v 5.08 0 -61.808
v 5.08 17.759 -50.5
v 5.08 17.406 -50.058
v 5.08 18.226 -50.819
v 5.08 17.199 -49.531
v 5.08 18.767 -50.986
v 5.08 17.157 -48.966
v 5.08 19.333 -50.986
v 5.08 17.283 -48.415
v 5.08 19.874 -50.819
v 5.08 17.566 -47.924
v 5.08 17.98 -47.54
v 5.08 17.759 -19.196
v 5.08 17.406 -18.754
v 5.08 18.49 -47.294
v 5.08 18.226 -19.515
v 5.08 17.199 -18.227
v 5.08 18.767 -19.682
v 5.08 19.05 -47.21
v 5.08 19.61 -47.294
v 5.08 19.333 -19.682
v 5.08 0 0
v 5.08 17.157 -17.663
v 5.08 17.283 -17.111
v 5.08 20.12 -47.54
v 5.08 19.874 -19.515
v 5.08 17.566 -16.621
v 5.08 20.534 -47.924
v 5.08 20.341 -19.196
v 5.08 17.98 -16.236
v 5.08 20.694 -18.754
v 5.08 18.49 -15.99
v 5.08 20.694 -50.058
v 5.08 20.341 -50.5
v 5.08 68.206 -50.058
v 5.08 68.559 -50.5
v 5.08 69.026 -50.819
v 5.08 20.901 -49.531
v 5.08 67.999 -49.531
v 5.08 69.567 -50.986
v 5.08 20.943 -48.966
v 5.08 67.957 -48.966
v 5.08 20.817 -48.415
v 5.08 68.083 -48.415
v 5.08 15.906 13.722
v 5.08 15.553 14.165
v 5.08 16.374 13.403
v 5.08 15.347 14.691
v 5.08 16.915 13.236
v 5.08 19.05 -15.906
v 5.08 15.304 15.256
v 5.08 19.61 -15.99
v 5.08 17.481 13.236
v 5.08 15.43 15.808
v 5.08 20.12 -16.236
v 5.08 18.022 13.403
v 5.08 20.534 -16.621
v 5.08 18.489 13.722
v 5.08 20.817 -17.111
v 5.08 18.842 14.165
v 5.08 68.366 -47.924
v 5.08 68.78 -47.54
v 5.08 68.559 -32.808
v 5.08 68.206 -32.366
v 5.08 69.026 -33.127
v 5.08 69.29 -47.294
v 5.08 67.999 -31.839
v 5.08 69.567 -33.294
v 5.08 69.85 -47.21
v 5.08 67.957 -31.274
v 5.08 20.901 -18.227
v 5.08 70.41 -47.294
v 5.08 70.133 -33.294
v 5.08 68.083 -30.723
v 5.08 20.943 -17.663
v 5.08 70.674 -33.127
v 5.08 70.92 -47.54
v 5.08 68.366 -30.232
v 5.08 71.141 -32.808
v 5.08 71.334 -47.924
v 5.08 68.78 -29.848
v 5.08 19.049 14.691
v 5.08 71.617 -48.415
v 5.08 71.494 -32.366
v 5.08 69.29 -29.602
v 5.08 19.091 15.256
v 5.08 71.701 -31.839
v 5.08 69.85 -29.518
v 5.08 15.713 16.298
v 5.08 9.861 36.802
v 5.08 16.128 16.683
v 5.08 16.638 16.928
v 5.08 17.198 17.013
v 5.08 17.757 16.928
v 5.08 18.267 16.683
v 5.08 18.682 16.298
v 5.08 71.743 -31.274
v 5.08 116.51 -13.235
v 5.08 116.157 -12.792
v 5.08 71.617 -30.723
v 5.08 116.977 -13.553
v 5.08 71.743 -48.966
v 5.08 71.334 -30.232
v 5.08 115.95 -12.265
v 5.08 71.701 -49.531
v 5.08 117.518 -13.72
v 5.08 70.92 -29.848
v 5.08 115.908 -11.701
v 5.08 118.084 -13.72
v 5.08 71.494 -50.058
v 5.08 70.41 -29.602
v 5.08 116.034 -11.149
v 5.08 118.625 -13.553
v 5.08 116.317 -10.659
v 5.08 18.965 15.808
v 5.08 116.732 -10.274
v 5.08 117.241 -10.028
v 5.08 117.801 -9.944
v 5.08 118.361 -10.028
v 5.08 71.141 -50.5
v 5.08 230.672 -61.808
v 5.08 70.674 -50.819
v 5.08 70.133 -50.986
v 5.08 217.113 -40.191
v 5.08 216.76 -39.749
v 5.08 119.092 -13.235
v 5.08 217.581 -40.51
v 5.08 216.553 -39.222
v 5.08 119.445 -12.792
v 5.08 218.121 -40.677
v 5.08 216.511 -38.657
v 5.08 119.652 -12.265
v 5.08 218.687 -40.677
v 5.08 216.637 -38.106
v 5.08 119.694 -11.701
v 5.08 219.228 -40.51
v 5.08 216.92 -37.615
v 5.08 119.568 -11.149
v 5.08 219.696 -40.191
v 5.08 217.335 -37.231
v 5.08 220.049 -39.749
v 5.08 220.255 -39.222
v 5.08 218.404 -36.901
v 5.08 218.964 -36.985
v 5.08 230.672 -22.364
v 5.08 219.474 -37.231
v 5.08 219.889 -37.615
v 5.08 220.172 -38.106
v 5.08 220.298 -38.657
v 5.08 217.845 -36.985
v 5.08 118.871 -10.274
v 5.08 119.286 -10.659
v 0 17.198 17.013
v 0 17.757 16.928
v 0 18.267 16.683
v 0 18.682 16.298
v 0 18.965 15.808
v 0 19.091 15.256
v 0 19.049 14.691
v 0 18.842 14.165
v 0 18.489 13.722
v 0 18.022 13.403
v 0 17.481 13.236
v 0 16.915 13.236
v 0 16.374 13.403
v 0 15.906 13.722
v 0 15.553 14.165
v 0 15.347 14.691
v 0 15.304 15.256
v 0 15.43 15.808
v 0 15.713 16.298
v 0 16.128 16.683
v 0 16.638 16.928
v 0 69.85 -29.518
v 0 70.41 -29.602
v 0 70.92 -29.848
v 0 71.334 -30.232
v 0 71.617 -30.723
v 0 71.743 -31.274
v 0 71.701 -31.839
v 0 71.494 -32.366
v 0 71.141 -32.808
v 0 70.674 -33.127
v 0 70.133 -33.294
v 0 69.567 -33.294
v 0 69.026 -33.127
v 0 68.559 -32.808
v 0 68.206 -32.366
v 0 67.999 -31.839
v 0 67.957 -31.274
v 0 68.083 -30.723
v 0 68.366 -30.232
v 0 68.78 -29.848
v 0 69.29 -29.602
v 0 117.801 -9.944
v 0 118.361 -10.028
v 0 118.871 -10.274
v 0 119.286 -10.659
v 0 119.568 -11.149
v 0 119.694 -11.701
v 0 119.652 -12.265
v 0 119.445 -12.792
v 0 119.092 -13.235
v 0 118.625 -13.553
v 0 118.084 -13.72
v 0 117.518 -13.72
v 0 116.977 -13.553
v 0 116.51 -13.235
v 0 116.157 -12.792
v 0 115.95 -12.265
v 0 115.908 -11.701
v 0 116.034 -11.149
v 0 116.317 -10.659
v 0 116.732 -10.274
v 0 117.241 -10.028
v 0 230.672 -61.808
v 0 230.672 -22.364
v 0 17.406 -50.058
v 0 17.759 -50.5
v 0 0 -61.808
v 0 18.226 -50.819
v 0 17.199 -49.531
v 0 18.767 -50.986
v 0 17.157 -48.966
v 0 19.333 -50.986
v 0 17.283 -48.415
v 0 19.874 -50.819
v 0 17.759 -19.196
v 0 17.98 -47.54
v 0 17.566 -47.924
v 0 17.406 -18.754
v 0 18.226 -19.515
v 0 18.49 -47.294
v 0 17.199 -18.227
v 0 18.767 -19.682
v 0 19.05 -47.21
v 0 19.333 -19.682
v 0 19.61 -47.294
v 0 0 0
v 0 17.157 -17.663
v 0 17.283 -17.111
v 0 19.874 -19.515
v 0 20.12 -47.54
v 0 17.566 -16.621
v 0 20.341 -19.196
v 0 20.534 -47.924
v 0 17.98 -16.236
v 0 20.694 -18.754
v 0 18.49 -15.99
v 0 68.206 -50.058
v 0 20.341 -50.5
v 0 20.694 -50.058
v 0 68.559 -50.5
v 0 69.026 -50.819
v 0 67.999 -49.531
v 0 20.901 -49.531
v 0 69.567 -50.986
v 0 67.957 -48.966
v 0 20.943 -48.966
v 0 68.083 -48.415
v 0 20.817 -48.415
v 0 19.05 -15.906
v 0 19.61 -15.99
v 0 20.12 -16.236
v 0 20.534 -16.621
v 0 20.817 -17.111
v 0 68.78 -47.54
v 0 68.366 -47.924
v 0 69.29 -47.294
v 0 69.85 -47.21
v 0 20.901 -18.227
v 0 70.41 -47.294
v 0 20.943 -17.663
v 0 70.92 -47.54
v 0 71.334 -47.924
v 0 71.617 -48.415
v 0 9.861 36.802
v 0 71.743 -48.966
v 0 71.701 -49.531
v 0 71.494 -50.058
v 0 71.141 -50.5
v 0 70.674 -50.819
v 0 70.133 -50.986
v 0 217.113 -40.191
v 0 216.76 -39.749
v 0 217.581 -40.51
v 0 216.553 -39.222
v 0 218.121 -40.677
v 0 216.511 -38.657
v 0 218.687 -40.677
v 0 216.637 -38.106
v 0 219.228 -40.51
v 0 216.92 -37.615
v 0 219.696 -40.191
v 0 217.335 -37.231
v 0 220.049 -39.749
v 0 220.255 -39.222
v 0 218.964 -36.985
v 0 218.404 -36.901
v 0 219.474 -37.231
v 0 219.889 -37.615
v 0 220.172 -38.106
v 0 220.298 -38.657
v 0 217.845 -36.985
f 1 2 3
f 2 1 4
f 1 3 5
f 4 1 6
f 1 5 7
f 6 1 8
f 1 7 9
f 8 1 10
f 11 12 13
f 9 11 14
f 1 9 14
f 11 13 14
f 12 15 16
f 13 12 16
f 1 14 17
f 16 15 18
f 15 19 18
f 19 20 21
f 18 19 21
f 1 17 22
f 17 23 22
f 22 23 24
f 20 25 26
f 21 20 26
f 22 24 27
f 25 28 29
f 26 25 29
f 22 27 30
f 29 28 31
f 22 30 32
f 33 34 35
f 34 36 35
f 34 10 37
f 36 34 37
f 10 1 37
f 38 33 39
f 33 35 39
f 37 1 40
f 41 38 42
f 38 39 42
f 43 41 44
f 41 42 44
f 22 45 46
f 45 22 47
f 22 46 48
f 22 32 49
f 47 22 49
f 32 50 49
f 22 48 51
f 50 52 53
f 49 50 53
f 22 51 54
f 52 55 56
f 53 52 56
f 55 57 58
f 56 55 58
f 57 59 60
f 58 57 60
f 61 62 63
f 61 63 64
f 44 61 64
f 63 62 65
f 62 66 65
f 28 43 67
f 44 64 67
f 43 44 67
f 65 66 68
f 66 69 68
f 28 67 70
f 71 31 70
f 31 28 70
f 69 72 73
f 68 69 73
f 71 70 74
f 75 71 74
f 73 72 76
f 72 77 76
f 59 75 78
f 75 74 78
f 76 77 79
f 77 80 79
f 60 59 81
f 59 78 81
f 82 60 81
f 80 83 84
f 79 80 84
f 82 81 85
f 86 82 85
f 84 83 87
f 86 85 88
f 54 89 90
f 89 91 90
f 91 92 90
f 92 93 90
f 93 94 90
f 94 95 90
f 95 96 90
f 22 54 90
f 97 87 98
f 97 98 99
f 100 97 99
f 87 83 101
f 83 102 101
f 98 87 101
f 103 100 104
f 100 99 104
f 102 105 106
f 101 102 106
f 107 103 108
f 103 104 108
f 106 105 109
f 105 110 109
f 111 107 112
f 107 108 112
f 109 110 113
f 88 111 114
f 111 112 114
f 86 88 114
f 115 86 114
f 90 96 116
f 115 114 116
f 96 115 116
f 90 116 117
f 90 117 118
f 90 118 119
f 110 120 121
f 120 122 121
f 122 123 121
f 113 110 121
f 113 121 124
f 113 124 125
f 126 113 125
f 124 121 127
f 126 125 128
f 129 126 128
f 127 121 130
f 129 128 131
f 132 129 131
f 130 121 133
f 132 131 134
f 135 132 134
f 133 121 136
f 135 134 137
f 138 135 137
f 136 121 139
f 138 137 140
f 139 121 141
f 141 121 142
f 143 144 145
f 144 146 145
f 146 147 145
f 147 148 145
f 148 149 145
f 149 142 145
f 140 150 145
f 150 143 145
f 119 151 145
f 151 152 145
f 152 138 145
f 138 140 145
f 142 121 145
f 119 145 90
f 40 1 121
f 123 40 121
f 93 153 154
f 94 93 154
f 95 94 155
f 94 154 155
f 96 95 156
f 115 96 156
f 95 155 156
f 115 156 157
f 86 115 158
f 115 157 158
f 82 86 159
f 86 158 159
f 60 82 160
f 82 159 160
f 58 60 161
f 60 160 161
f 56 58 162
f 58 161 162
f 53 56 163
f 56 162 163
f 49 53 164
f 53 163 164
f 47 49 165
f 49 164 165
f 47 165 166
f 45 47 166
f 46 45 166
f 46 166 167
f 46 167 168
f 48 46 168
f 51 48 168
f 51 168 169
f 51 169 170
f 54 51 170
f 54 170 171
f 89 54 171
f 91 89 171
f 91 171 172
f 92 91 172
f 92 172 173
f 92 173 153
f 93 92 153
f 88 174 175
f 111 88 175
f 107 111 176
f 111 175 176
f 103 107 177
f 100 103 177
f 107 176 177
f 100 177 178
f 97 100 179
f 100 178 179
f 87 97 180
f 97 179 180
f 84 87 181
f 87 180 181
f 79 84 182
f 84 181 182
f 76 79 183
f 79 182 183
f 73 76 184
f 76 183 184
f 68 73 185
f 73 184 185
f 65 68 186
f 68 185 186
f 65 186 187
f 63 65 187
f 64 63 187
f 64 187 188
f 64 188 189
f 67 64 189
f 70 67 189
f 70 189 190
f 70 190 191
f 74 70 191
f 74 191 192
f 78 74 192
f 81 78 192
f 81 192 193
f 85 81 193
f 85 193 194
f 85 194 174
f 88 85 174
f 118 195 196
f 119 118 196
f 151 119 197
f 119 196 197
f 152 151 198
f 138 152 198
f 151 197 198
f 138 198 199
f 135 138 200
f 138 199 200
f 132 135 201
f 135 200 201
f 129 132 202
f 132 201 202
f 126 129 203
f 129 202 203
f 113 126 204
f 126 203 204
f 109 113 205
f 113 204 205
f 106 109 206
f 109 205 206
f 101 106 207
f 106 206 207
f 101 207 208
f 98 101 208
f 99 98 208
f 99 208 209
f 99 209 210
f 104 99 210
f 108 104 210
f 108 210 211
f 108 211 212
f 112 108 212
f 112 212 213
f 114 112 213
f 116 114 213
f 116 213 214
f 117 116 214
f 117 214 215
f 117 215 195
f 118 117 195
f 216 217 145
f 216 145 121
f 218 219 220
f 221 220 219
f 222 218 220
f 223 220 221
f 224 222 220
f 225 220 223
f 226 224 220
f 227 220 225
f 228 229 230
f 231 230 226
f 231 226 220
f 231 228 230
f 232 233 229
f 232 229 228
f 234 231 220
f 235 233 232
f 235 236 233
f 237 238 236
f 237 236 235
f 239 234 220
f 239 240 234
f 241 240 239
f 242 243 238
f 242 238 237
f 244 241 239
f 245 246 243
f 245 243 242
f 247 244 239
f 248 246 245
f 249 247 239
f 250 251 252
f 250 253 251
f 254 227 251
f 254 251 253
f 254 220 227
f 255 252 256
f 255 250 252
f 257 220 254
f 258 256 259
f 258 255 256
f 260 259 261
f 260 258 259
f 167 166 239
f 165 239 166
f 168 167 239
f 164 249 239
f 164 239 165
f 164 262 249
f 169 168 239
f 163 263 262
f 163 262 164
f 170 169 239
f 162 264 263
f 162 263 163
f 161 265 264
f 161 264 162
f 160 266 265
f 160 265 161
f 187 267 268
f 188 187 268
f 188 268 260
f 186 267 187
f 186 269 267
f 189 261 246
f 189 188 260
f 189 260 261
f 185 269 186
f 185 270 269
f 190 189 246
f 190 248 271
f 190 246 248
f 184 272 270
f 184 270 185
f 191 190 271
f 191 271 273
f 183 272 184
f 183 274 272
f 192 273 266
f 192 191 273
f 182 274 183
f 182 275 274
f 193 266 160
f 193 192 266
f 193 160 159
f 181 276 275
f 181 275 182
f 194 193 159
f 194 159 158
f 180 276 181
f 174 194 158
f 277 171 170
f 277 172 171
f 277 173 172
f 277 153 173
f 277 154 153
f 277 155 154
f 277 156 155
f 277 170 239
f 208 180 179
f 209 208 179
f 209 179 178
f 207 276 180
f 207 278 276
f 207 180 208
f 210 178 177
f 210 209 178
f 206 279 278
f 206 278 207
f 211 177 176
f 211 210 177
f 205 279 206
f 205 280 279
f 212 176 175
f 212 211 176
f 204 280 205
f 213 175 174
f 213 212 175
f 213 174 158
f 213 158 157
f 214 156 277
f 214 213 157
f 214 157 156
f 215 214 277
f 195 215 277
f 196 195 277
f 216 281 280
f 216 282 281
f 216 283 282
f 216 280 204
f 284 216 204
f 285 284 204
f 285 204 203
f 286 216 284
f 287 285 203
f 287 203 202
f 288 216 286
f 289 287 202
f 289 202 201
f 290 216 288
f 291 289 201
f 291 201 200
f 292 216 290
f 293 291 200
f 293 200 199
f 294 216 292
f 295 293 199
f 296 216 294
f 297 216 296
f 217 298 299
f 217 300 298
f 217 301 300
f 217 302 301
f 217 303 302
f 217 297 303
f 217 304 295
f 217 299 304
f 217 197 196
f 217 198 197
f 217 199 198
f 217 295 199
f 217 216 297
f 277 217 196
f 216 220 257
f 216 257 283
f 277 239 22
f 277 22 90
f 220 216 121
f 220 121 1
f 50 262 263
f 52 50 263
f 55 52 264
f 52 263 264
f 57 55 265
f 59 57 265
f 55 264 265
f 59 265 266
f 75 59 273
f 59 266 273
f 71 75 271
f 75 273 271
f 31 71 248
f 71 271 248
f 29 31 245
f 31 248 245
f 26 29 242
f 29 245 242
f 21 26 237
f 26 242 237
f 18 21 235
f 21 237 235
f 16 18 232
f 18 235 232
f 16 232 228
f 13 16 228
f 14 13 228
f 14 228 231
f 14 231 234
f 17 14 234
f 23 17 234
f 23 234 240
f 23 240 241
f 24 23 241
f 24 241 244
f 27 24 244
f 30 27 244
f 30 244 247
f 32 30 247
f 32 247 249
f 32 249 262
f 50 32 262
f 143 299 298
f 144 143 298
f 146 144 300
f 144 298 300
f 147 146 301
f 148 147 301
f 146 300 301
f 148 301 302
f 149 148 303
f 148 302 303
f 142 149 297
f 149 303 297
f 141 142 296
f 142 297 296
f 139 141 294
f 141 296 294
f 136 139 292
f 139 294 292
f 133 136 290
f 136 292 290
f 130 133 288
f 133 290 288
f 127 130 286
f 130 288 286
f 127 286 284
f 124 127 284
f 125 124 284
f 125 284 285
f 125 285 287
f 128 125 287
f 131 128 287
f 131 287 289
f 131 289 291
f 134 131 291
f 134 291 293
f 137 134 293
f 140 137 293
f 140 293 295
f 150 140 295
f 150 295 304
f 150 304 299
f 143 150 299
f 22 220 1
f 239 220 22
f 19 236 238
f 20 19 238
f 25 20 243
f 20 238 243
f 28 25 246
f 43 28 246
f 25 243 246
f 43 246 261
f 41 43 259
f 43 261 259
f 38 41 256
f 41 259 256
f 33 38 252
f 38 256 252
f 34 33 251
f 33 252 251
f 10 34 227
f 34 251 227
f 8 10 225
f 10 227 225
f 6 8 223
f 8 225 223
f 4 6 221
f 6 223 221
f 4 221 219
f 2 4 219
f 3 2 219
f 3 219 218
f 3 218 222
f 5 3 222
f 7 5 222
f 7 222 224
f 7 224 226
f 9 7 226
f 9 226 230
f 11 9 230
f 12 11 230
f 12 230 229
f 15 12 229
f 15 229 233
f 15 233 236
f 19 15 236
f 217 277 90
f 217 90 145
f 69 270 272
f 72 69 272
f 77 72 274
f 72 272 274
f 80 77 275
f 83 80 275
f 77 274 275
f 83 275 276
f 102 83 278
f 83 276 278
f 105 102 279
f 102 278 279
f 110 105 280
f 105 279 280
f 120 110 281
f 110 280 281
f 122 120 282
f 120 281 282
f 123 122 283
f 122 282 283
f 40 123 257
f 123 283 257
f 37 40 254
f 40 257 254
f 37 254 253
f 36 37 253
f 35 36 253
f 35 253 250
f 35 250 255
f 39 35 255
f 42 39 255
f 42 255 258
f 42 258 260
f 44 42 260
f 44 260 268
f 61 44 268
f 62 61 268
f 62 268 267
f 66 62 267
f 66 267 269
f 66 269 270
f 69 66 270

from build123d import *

# Parameters (mm, degrees)
BOSS_EXTRUDE1_DEPTH   = 5.08
F_6_CLEARANCE_HOLE1_D = 3.7973


with BuildPart() as part:
    # Sketch1 → Boss-Extrude1 (new body)
    with BuildSketch(Plane(origin=(0, 0, 0), x_dir=(0, 0, -1), z_dir=(1, 0, 0))):
        Polygon((0, 0), (-36.801773982, 9.861005618), (22.364259729, 230.671649508), (61.808282202, 230.671649508), (61.808282202, 0), align=None)
    extrude(amount=BOSS_EXTRUDE1_DEPTH)

    # #6 Clearance Hole1 (through all)
    with Locations(Plane(origin=(5.08, 0, 0), x_dir=(0, 0, -1), z_dir=(1, 0, 0))):
        with Locations((49.108282202, 69.85), (38.799269093, 218.404391514), (11.842691987, 117.801076159), (-15.113885118, 17.197760803), (49.108282202, 19.05), (17.804432116, 19.05), (31.416251091, 69.85)):
            Hole(F_6_CLEARANCE_HOLE1_D / 2)


solid = part.part
